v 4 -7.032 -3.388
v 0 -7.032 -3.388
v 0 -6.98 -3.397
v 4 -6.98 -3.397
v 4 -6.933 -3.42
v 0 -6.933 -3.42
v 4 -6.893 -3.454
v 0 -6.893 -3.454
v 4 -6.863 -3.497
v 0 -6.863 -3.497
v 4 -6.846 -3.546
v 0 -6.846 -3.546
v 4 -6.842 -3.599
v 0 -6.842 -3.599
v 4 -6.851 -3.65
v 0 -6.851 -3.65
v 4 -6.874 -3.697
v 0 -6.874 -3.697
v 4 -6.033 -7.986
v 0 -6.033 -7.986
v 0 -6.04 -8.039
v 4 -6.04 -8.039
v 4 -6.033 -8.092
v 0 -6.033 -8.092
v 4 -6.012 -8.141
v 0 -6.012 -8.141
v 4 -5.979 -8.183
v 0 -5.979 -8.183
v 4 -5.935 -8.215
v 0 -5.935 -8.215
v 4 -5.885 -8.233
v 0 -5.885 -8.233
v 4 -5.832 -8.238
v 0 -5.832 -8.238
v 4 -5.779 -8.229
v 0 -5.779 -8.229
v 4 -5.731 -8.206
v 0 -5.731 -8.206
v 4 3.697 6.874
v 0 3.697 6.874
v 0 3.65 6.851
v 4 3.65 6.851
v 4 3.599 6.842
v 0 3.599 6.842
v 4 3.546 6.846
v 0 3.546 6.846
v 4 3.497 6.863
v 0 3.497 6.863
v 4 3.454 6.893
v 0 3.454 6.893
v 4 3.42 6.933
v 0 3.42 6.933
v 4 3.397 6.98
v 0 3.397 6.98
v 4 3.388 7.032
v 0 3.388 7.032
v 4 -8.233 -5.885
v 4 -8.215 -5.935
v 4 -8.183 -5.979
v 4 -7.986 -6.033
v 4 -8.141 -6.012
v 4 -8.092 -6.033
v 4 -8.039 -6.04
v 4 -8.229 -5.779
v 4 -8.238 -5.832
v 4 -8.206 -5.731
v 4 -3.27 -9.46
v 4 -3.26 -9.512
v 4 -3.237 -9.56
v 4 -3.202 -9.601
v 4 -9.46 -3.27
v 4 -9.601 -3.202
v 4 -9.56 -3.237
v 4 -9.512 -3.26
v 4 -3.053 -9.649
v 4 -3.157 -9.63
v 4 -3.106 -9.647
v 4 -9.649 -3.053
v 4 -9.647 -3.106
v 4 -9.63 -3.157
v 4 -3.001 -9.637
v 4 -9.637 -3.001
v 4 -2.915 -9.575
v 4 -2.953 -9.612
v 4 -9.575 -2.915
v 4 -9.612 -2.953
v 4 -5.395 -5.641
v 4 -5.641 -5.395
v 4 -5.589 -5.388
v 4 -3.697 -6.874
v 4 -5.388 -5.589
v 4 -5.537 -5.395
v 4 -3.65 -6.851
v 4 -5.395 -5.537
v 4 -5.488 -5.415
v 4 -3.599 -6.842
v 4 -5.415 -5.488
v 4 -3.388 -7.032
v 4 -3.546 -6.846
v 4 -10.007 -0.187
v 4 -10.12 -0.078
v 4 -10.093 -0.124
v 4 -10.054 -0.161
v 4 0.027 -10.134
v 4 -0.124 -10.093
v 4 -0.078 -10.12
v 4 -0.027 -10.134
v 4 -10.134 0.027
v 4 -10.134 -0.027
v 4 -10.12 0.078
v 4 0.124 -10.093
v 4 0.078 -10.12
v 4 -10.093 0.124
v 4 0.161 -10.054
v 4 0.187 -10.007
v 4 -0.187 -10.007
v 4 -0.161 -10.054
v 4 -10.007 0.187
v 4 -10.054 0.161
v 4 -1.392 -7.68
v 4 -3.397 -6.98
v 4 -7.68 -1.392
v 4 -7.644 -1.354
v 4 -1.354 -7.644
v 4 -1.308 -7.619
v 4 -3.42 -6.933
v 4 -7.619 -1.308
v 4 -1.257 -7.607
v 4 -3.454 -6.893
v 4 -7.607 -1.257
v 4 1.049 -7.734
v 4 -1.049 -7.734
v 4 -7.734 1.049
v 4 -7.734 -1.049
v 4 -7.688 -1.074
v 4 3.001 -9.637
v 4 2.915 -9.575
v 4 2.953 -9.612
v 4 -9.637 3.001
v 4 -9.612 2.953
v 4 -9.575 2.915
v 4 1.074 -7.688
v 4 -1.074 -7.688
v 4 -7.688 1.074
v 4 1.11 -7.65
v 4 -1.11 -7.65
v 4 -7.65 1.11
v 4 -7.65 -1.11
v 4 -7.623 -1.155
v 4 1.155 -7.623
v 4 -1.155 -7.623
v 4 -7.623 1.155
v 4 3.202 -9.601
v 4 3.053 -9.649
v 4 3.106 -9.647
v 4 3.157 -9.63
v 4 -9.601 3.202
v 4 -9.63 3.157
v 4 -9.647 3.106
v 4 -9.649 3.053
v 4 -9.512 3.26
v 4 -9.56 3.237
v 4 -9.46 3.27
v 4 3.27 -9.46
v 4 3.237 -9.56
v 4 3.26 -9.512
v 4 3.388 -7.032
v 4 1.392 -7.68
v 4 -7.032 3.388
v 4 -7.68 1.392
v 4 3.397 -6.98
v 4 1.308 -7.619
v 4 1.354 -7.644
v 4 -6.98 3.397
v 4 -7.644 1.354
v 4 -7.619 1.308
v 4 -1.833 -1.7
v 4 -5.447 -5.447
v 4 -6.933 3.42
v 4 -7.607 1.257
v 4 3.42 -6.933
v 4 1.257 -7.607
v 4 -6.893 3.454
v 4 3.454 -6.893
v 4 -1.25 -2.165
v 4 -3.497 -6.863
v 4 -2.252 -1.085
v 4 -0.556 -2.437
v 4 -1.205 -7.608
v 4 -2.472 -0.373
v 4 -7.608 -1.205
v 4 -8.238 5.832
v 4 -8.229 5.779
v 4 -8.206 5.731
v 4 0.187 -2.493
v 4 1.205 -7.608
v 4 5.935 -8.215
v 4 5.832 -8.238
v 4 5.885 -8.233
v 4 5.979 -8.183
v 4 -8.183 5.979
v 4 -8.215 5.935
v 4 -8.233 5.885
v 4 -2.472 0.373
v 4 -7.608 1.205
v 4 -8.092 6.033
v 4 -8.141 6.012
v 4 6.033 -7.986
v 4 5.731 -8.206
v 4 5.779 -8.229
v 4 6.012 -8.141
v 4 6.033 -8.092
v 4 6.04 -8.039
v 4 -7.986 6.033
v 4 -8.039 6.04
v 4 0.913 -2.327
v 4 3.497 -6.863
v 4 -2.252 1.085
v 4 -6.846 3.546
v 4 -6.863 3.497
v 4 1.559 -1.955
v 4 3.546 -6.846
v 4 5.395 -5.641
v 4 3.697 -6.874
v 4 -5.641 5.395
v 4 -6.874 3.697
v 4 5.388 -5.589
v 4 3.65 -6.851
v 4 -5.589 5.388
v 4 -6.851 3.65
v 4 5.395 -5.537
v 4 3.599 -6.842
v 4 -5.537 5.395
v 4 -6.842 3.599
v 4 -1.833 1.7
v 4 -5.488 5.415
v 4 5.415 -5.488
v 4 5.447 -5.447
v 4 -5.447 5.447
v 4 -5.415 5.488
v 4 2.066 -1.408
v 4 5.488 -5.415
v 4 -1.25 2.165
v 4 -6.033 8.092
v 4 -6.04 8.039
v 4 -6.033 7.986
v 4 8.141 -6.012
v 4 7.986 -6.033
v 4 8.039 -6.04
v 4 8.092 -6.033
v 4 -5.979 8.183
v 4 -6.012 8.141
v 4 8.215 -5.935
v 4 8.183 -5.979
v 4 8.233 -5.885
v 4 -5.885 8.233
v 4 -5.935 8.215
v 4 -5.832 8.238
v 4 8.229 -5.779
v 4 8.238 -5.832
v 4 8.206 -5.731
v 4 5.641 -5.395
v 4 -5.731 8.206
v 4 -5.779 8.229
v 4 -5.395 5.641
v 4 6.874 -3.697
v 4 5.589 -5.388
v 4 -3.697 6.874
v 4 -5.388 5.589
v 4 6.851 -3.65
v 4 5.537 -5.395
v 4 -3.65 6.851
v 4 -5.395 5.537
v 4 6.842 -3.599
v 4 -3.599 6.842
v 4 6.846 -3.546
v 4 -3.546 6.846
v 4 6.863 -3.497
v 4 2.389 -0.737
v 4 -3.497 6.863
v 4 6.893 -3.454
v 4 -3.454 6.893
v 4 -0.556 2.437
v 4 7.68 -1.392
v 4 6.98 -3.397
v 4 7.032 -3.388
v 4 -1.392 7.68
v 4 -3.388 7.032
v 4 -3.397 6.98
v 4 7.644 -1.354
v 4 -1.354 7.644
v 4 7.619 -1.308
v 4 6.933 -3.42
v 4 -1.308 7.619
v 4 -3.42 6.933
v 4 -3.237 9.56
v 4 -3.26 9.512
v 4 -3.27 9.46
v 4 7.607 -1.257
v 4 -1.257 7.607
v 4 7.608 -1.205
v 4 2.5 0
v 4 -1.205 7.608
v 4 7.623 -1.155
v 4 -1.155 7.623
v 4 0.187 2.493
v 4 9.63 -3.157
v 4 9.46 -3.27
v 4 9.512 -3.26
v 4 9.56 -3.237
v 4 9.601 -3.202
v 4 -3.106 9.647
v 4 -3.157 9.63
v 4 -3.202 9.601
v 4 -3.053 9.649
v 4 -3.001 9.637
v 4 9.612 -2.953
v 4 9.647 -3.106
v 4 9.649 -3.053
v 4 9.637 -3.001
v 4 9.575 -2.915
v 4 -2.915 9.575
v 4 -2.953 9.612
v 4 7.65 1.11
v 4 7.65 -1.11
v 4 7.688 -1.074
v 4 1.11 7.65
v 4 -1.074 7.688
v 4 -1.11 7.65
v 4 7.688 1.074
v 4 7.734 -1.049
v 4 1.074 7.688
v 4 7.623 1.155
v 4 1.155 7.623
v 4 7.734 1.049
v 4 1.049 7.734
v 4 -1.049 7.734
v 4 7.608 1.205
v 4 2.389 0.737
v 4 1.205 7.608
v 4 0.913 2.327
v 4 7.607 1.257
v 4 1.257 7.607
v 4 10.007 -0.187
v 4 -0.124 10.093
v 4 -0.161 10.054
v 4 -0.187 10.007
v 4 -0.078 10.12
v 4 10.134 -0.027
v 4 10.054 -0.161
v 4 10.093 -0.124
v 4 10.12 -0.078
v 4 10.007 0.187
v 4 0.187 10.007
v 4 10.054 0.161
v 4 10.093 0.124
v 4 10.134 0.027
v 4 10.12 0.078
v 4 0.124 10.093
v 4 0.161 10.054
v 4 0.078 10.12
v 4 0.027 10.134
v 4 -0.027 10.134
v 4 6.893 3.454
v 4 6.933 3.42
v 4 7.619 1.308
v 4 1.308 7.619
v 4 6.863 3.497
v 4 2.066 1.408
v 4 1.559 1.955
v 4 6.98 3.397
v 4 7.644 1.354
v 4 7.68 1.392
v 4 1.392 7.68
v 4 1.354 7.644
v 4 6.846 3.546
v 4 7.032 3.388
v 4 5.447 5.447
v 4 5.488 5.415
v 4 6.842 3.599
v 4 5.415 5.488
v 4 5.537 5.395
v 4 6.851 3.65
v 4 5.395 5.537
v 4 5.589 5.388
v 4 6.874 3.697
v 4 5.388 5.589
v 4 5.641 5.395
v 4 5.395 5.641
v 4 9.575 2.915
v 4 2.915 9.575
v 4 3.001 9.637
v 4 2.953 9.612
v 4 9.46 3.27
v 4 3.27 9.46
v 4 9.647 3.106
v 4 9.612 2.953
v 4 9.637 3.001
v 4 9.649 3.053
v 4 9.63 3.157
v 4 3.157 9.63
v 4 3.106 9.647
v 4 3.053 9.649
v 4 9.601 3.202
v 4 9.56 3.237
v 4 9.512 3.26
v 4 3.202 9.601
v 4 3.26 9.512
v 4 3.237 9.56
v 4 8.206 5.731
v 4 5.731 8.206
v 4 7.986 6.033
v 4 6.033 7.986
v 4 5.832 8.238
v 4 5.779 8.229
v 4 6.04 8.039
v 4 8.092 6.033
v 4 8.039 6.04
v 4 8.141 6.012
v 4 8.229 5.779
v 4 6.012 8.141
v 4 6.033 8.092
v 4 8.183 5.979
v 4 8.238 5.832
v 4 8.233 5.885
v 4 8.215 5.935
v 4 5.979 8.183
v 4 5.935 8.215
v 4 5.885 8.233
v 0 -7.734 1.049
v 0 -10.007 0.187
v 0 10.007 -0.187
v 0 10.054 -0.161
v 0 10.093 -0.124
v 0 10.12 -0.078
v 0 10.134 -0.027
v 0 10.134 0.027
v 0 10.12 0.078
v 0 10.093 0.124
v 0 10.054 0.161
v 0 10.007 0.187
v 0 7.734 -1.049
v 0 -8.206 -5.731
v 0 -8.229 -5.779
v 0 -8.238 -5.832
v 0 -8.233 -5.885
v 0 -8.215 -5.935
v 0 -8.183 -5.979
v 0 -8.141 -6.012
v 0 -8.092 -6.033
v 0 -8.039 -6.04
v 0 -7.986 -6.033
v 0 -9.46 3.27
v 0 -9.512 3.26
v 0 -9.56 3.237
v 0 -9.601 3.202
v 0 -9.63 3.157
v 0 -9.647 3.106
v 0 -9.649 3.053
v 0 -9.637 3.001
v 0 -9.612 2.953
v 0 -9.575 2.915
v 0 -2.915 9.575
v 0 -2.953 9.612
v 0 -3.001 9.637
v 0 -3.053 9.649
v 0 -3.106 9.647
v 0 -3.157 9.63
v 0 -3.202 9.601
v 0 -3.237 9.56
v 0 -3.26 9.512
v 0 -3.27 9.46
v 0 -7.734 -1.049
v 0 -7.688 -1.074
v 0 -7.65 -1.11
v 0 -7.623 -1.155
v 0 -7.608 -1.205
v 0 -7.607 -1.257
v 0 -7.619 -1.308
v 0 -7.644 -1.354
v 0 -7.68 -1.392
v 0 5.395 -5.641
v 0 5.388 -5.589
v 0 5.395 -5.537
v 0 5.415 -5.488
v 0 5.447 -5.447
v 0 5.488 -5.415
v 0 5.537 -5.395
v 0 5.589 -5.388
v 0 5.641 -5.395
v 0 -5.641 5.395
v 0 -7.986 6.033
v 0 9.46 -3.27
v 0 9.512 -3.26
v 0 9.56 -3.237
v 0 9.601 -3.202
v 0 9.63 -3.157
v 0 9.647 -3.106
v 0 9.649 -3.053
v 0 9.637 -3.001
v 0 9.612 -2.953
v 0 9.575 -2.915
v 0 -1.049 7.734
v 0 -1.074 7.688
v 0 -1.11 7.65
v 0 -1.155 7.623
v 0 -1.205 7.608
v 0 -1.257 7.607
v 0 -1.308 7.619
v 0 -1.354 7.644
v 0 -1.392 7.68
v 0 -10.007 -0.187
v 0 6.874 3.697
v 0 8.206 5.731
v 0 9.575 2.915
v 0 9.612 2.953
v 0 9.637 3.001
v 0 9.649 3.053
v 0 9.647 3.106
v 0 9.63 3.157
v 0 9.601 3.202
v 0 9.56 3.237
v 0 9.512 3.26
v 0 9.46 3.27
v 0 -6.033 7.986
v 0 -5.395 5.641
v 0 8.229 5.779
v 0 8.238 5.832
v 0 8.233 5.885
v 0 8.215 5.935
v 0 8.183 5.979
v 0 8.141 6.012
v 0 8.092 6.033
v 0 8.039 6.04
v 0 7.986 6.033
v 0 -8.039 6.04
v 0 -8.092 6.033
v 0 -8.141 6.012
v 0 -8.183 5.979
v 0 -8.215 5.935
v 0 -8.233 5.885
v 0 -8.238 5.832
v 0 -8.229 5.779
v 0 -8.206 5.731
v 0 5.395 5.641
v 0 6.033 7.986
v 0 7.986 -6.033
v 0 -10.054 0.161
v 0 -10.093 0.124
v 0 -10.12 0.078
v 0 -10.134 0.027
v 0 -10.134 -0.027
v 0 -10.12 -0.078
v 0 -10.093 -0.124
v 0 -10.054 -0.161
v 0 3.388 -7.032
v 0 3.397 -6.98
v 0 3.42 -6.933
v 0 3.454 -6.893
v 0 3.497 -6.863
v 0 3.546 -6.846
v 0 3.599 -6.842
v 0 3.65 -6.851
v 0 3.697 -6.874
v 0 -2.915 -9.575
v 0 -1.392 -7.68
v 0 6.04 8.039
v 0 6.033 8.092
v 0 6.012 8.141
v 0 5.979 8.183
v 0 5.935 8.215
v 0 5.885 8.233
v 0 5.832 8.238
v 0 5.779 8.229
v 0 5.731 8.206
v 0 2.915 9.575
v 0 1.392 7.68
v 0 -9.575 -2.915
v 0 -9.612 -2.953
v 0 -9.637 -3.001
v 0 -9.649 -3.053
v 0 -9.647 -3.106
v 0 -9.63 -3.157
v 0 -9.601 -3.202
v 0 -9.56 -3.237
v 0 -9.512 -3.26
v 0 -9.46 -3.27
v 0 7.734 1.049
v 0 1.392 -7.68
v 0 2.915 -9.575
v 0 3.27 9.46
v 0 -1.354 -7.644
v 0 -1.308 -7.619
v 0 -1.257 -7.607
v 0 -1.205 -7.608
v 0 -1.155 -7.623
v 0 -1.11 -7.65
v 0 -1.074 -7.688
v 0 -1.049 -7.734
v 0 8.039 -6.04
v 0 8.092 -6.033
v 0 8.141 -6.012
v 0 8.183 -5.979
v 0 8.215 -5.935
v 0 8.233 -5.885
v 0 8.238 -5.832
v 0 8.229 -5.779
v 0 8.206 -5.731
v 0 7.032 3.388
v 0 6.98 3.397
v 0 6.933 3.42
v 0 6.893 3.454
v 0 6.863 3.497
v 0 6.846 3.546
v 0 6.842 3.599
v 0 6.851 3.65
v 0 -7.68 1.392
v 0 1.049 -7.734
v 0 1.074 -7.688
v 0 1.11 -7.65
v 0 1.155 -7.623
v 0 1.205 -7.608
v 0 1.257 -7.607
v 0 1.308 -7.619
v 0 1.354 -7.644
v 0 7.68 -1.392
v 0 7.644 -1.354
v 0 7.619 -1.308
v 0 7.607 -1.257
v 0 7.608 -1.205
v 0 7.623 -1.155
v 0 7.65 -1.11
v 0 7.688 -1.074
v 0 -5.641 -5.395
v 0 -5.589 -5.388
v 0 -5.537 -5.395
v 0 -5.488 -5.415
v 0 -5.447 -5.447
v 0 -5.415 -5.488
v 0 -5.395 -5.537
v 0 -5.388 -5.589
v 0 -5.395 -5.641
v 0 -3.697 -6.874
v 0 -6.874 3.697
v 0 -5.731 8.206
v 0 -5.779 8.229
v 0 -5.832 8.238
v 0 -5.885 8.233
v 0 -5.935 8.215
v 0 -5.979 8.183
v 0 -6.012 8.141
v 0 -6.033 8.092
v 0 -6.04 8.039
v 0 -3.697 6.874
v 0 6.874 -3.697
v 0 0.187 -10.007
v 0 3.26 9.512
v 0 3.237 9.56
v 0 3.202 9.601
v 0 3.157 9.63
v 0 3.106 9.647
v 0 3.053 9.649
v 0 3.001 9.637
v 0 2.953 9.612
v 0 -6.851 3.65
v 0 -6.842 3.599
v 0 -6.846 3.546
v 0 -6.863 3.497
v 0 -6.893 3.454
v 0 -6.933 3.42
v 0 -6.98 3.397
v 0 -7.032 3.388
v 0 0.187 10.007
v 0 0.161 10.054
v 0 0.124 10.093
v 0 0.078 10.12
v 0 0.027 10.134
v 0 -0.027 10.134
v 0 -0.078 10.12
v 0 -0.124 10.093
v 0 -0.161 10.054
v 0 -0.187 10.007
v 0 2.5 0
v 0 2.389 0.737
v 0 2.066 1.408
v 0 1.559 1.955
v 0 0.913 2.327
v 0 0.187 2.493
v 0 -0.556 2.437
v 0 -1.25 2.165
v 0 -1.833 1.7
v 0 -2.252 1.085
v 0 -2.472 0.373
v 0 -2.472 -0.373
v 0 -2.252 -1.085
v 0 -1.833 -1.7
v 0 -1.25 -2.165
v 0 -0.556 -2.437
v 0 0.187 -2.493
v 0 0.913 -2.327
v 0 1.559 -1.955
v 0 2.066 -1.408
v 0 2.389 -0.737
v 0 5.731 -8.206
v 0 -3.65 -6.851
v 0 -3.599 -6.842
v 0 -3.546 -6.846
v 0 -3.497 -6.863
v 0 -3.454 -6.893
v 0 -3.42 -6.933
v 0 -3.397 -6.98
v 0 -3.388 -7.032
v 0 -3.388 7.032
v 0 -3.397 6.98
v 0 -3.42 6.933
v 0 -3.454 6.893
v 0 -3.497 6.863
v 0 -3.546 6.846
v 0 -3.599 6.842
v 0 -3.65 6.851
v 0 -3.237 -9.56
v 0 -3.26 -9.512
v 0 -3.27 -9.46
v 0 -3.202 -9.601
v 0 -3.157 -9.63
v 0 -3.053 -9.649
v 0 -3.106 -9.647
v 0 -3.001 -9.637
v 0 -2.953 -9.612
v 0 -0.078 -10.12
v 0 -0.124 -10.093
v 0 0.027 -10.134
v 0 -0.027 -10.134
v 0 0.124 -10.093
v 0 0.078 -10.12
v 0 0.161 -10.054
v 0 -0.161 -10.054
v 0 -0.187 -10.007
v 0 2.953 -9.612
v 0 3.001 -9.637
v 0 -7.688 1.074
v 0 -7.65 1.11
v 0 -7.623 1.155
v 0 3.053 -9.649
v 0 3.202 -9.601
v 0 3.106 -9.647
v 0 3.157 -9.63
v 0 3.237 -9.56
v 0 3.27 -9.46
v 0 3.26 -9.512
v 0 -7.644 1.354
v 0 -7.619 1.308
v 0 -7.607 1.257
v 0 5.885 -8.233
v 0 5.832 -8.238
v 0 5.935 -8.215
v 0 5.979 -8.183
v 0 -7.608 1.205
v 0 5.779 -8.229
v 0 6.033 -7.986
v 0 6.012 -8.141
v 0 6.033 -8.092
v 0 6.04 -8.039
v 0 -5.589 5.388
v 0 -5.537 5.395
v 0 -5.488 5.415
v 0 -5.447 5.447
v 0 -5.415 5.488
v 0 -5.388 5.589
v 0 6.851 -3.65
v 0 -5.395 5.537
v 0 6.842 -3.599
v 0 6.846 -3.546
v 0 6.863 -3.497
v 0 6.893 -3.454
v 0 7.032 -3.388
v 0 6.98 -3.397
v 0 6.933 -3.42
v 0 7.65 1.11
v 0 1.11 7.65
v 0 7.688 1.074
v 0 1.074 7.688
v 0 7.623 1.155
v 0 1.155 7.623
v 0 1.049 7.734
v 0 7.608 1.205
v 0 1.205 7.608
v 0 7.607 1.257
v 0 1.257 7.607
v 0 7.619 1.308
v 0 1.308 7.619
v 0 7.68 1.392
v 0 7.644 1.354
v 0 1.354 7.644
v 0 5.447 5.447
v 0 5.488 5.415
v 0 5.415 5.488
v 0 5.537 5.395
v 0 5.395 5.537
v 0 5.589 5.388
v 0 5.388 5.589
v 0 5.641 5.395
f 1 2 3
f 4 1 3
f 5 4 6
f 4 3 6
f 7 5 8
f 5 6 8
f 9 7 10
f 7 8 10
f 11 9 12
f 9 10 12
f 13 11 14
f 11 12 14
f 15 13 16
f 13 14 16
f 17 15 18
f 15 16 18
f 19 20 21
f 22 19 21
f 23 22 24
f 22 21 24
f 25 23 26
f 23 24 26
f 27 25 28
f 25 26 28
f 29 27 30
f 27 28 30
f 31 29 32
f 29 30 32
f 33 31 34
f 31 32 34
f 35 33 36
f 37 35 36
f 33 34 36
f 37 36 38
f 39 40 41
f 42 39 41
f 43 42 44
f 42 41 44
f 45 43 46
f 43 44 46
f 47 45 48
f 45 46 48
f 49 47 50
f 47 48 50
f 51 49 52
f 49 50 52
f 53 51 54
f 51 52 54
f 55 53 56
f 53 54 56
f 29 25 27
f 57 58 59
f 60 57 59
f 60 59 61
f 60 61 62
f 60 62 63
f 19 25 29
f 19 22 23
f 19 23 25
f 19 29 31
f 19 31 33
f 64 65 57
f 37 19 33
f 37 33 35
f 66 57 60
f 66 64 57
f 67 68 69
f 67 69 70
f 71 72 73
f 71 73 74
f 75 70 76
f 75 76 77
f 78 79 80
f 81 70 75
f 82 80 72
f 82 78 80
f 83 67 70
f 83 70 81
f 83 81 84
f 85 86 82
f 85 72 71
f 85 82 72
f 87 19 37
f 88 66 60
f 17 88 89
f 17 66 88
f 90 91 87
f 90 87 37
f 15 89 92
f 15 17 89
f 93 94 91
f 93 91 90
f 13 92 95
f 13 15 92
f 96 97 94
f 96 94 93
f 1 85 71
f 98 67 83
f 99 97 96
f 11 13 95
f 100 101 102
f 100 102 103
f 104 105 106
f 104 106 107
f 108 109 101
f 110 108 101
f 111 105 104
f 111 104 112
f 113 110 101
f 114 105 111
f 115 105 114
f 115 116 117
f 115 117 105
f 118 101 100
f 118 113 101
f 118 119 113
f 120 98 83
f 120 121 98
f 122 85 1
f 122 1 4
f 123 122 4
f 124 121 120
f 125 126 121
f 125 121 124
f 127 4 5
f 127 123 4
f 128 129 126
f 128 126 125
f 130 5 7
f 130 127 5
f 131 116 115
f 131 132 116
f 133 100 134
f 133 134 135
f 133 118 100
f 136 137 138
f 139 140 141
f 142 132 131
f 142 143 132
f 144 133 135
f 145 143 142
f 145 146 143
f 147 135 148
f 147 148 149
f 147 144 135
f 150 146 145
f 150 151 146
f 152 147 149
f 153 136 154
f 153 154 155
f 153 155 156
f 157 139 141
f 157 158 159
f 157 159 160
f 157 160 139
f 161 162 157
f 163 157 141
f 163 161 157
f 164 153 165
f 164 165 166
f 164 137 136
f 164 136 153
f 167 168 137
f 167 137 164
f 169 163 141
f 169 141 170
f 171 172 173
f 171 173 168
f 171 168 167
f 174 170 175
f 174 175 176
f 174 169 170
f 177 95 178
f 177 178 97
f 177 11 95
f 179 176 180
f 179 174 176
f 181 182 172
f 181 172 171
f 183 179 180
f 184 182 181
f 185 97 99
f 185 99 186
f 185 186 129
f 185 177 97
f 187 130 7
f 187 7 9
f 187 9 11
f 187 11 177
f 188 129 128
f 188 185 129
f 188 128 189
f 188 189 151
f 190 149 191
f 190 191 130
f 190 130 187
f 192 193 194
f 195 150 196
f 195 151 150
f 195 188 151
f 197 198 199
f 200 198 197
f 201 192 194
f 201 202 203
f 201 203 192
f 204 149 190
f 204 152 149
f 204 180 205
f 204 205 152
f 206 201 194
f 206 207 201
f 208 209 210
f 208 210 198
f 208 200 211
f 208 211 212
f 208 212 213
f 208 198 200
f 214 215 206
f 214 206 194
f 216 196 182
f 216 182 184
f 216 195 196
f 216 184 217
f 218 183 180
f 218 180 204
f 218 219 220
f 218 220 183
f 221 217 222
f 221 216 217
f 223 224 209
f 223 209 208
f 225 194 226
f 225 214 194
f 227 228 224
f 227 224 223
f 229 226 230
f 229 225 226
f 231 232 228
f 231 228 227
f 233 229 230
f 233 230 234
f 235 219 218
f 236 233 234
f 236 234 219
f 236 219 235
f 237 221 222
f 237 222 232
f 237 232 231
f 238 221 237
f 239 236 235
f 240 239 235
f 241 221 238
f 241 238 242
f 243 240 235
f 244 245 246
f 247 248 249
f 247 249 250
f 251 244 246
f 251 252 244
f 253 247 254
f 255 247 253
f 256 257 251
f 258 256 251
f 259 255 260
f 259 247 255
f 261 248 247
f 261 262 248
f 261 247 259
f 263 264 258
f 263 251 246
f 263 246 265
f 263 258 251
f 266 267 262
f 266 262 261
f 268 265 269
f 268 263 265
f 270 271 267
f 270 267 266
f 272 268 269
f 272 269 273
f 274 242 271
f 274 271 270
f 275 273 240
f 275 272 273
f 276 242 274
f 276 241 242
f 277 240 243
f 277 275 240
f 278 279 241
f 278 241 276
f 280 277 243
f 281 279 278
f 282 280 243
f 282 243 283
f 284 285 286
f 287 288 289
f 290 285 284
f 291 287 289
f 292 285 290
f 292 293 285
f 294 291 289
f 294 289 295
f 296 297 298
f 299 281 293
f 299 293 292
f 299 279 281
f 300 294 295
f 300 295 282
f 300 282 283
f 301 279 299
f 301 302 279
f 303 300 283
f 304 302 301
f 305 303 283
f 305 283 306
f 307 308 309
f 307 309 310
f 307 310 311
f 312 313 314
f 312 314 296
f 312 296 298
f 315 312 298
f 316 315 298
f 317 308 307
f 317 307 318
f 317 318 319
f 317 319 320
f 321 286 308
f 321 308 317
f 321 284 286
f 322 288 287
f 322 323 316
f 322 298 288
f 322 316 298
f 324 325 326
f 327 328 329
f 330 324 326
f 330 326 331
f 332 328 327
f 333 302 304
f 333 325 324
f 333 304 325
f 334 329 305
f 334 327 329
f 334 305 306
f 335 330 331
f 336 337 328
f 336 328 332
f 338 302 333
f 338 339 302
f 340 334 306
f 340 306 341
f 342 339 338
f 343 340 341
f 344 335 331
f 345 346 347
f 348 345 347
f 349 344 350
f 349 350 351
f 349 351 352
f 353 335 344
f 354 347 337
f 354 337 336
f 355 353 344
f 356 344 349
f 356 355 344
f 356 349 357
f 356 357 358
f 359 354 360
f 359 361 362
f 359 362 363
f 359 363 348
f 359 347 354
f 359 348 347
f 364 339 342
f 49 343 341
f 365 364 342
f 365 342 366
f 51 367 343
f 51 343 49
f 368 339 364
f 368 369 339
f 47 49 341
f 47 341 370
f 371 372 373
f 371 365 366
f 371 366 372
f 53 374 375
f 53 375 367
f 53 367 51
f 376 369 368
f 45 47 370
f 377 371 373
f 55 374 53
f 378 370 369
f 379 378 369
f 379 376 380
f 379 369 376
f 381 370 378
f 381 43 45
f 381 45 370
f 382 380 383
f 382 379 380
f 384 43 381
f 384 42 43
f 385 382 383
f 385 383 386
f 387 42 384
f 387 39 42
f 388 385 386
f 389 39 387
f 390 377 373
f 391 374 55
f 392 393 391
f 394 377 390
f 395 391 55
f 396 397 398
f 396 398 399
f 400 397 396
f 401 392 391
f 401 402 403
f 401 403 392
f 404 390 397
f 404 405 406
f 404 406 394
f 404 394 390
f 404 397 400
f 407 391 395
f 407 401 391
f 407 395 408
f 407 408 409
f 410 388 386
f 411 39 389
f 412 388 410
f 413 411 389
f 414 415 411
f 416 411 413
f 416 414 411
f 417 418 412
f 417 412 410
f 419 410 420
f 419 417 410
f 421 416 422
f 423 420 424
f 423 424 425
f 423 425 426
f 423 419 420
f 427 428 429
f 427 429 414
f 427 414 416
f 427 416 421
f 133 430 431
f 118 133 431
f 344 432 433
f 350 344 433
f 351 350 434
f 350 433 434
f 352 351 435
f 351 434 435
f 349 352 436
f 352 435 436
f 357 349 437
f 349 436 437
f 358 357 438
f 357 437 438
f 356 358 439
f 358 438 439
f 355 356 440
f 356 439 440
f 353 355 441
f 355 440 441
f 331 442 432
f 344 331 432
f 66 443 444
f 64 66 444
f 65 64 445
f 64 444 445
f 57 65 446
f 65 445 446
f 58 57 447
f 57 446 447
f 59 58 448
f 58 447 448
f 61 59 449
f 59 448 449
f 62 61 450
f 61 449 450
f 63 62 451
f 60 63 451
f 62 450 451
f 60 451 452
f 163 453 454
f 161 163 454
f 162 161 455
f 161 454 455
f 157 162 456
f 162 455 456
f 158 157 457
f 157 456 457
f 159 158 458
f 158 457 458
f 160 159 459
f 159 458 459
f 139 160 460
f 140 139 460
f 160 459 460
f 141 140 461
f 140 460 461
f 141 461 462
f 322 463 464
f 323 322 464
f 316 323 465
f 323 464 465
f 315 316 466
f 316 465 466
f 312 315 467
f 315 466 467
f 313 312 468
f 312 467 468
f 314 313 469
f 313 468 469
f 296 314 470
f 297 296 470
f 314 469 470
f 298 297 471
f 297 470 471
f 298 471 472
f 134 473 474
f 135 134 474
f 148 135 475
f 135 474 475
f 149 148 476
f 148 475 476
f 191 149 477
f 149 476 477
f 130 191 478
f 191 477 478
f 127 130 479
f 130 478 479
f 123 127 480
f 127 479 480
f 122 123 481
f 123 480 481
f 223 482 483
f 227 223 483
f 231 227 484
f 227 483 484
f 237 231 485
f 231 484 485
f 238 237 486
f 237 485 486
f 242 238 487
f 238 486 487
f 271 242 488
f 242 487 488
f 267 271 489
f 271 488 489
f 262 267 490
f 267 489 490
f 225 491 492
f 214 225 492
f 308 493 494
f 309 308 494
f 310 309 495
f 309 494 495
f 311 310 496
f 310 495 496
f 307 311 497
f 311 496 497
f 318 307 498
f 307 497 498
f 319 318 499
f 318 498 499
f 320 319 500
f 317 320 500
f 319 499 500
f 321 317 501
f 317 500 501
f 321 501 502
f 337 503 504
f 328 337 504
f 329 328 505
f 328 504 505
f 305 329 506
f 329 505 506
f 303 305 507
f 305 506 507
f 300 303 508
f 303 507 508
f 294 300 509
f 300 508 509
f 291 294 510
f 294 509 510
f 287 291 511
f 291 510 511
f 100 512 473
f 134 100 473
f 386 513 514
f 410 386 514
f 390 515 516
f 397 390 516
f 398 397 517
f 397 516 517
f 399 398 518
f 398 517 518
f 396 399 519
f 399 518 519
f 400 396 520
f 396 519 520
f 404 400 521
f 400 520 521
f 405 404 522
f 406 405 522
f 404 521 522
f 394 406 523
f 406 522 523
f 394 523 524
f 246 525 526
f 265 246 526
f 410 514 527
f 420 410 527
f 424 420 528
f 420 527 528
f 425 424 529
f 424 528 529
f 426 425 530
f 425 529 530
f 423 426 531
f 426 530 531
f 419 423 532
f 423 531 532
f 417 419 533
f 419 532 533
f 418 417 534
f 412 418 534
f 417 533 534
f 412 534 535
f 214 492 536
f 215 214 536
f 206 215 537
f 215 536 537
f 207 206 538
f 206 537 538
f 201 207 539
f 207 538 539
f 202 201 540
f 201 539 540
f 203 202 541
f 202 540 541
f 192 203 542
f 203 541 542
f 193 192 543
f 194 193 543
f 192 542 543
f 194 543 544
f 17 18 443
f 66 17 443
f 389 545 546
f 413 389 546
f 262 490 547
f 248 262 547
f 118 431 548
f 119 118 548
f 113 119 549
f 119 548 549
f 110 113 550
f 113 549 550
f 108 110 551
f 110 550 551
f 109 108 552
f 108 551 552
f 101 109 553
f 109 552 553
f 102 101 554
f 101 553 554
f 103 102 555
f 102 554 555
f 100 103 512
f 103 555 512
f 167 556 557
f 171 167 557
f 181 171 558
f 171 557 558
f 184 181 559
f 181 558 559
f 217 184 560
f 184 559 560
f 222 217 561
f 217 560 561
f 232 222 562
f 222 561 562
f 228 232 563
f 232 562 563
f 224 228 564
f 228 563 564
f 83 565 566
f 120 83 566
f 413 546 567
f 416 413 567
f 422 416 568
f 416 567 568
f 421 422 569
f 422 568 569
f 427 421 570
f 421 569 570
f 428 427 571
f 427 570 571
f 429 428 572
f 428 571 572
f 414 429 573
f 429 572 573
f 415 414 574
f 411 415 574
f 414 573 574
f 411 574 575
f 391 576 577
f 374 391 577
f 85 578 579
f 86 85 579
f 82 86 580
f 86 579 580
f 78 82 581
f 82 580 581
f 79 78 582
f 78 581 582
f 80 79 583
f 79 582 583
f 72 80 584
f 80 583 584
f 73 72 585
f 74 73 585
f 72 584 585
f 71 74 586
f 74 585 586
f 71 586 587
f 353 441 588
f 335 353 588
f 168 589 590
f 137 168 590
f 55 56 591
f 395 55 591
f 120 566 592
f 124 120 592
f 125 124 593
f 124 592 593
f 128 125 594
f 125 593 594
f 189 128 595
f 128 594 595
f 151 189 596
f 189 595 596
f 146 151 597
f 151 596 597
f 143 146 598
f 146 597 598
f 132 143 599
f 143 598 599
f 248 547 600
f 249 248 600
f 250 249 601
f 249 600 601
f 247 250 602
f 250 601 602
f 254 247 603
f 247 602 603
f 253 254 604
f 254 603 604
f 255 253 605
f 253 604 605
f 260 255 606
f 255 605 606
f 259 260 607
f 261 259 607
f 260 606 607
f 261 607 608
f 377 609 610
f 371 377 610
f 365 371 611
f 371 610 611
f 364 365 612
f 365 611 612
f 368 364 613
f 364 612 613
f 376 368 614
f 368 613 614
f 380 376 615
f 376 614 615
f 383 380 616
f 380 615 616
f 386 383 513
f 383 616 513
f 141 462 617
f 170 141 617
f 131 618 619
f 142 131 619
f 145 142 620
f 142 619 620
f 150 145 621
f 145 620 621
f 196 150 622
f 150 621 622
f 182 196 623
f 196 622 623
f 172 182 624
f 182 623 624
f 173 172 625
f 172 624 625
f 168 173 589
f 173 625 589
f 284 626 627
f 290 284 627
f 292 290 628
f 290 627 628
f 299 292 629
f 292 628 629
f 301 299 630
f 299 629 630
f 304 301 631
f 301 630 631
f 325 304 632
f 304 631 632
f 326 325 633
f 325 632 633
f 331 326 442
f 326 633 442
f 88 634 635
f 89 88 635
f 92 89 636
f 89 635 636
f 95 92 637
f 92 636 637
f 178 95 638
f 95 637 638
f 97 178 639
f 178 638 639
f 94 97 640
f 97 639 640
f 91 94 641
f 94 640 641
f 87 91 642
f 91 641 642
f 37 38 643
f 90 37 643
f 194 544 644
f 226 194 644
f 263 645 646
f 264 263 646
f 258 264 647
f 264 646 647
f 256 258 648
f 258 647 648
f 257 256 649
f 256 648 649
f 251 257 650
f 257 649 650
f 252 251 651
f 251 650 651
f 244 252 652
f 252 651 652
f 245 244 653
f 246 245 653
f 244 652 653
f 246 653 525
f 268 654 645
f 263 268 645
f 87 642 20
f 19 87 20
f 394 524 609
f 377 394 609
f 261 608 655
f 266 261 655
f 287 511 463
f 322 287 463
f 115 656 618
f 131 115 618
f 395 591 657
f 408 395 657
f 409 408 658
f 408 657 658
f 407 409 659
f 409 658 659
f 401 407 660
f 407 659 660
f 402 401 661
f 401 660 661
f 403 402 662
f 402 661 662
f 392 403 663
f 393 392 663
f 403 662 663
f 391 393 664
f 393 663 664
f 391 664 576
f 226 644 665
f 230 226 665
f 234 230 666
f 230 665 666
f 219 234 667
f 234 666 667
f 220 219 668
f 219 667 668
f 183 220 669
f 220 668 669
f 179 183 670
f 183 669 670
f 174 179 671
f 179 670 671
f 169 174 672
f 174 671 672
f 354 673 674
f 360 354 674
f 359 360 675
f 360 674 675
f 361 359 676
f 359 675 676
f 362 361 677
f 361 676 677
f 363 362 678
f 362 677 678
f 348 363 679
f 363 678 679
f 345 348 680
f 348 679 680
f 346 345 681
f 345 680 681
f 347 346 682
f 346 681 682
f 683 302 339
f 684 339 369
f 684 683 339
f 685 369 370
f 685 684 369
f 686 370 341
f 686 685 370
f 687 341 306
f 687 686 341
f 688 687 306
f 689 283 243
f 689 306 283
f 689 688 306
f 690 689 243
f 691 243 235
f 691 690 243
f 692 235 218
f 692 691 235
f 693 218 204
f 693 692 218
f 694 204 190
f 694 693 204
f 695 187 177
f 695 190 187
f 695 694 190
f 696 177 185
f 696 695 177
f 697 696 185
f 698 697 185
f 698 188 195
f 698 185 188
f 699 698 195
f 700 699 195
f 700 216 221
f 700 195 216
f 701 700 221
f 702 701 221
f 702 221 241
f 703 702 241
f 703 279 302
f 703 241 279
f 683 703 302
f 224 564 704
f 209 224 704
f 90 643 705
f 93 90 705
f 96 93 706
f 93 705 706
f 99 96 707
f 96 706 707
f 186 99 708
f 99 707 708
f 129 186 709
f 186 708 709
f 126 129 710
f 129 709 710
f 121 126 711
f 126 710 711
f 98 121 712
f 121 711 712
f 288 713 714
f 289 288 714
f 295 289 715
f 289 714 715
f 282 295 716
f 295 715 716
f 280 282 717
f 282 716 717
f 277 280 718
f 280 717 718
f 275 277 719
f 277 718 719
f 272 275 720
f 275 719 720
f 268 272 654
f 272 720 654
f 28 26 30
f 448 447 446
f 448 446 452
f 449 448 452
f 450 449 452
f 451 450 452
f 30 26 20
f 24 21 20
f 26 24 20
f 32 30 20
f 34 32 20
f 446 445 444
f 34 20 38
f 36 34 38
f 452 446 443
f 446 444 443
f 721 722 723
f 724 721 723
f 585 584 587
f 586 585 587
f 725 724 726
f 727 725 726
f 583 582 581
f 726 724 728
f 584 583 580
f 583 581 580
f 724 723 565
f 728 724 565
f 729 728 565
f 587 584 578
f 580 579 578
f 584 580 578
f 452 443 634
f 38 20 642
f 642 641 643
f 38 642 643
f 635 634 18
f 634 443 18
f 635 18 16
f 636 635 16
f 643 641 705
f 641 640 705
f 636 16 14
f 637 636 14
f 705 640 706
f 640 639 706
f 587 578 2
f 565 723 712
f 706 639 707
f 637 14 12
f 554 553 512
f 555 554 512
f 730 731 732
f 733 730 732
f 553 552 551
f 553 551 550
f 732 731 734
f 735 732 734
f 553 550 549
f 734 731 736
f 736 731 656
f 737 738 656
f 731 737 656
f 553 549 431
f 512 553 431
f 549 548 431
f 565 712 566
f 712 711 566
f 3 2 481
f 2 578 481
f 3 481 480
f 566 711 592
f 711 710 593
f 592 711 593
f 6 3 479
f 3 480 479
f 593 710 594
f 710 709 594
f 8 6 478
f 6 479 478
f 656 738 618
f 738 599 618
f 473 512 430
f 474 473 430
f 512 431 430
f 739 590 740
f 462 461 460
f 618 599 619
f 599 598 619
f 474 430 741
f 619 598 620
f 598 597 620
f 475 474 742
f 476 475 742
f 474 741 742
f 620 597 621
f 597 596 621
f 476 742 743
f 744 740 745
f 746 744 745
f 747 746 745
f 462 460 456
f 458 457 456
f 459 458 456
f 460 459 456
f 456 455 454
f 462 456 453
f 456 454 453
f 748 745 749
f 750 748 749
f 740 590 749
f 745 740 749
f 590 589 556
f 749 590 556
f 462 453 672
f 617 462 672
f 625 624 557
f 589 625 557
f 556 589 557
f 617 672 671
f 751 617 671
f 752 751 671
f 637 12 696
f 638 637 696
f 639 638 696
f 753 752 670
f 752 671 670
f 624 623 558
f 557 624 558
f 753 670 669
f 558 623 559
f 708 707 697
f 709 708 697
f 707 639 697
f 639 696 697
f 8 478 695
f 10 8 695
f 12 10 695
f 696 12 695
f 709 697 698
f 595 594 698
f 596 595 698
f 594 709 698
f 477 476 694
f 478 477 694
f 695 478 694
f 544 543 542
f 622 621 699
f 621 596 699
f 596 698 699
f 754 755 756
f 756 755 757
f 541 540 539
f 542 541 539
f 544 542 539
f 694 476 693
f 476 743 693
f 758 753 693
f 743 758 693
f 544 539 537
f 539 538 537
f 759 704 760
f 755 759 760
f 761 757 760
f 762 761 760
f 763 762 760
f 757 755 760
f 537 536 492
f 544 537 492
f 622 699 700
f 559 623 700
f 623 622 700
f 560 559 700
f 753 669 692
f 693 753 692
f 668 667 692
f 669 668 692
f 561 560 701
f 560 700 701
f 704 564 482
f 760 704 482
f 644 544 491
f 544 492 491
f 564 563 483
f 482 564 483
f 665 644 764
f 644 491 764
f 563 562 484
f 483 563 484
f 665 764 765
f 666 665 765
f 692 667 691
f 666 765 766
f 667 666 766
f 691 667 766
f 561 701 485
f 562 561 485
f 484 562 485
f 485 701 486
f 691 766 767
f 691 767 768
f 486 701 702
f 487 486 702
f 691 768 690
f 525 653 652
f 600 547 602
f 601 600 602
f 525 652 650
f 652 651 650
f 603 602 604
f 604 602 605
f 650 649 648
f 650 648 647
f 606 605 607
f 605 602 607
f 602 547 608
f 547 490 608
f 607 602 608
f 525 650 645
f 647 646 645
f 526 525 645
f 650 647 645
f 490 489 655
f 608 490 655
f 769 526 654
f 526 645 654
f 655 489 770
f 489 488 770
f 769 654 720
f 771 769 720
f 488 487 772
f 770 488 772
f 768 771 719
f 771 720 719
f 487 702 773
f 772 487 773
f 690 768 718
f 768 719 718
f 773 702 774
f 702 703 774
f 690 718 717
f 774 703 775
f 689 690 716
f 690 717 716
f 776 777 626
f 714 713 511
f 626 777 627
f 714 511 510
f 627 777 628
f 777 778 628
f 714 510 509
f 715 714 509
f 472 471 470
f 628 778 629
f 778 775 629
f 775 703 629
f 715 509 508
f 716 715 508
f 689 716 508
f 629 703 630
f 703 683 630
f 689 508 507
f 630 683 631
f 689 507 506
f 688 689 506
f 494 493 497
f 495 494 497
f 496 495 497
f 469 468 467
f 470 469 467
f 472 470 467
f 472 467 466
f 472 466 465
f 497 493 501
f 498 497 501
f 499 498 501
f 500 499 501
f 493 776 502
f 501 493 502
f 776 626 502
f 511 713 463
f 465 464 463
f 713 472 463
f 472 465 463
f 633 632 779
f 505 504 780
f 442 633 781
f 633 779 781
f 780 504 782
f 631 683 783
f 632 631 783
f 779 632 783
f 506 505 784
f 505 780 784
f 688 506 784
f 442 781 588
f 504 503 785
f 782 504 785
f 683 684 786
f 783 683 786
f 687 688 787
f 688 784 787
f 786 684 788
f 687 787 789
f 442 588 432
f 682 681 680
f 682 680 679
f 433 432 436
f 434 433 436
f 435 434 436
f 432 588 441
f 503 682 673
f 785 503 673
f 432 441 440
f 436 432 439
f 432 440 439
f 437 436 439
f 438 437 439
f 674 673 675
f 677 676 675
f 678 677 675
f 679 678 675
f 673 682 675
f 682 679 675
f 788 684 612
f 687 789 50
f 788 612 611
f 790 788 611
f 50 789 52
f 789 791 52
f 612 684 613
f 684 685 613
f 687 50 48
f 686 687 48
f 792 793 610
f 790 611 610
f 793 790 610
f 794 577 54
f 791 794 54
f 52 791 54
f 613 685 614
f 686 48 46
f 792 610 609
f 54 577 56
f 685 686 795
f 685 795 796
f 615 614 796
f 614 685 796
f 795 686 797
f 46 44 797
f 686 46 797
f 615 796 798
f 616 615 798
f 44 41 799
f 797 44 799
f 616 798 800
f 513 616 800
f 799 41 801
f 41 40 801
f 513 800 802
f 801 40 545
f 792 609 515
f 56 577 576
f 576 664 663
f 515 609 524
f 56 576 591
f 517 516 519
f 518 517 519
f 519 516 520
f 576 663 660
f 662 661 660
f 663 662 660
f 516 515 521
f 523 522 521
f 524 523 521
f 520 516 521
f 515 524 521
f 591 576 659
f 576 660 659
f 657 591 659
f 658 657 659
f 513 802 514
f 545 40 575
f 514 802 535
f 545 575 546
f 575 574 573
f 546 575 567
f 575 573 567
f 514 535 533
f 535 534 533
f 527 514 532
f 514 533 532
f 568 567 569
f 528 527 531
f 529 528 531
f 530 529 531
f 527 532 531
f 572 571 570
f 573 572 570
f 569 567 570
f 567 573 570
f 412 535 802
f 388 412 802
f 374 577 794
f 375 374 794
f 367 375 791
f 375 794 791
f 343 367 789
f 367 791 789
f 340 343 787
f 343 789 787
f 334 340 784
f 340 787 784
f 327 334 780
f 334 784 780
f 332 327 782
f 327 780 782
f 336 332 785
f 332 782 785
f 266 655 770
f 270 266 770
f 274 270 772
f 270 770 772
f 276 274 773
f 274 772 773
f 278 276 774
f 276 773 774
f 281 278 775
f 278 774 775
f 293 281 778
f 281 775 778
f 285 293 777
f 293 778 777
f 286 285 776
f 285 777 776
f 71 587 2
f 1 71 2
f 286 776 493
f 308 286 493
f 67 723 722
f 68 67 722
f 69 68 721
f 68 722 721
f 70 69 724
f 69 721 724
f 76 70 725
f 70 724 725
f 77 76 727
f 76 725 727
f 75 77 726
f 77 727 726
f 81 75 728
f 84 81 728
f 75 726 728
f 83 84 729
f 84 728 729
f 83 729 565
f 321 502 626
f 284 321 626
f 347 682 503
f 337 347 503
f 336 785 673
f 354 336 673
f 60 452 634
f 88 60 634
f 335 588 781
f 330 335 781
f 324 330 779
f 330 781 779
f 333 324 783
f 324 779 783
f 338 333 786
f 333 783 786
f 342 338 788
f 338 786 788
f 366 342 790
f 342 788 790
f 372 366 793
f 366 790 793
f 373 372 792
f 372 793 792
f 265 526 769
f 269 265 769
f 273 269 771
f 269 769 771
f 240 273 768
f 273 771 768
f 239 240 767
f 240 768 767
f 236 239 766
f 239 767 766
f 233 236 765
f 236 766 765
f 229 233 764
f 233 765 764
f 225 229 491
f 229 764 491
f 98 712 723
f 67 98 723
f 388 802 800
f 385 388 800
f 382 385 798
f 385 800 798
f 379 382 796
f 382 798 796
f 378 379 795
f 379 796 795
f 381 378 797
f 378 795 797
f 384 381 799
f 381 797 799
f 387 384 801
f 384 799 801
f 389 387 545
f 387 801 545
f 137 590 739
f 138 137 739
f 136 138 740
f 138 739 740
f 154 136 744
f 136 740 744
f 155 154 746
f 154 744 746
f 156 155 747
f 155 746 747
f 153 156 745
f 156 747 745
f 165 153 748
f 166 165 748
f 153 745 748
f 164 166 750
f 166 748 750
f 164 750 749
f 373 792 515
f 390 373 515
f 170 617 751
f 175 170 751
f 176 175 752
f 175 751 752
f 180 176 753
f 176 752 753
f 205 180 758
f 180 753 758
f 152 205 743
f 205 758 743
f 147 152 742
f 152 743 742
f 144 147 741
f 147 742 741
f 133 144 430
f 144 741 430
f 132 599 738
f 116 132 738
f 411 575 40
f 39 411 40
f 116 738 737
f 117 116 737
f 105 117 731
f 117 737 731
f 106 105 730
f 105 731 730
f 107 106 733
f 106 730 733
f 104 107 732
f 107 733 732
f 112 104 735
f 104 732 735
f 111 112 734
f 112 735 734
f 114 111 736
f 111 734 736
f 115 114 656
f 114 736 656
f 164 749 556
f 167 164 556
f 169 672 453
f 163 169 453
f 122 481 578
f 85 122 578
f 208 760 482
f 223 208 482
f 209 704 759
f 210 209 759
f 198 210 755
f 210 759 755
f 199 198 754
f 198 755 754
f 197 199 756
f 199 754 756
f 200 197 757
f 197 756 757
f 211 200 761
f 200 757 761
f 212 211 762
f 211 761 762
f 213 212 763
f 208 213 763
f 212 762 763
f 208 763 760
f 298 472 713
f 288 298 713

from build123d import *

# Parameters (mm, degrees)
F1_DEPTH = 4
F2_R     = 2.5
F3_DEPTH = 4.001


with BuildPart() as f1:
    # F0 (on Right) → F1 (new body)
    with BuildSketch(Plane.YZ):
        with BuildLine():
            ThreePointArc((0.186993, 10.007145), (0, 10.136198), (-0.186993, 10.007145))
            Line((-0.186993, 10.007145), (-1.049264, 7.734473))
            ThreePointArc((-1.049264, 7.734473), (-1.20497, 7.607883), (-1.392175, 7.680162))
            Line((-1.392175, 7.680162), (-2.914536, 9.575144))
            ThreePointArc((-2.914536, 9.575144), (-3.132257, 9.640097), (-3.270219, 9.459576))
            Line((-3.270219, 9.459576), (-3.387993, 7.031681))
            ThreePointArc((-3.387993, 7.031681), (-3.49696, 6.86317), (-3.697337, 6.874062))
            Line((-3.697337, 6.874062), (-5.730771, 8.205862))
            ThreePointArc((-5.730771, 8.205862), (-5.957908, 8.200356), (-6.033333, 7.986038))
            Line((-6.033333, 7.986038), (-5.395082, 5.640579))
            ThreePointArc((-5.395082, 5.640579), (-5.446643, 5.446643), (-5.640579, 5.395082))
            Line((-5.640579, 5.395082), (-7.986038, 6.033333))
            ThreePointArc((-7.986038, 6.033333), (-8.200356, 5.957908), (-8.205862, 5.730771))
            Line((-8.205862, 5.730771), (-6.874062, 3.697337))
            ThreePointArc((-6.874062, 3.697337), (-6.86317, 3.49696), (-7.031681, 3.387993))
            Line((-7.031681, 3.387993), (-9.459576, 3.270219))
            ThreePointArc((-9.459576, 3.270219), (-9.640097, 3.132257), (-9.575144, 2.914536))
            Line((-9.575144, 2.914536), (-7.680162, 1.392175))
            ThreePointArc((-7.680162, 1.392175), (-7.607883, 1.20497), (-7.734473, 1.049264))
            Line((-7.734473, 1.049264), (-10.007145, 0.186993))
            ThreePointArc((-10.007145, 0.186993), (-10.136198, 0), (-10.007145, -0.186993))
            Line((-10.007145, -0.186993), (-7.734473, -1.049264))
            ThreePointArc((-7.734473, -1.049264), (-7.607883, -1.20497), (-7.680162, -1.392175))
            Line((-7.680162, -1.392175), (-9.575144, -2.914536))
            ThreePointArc((-9.575144, -2.914536), (-9.640097, -3.132257), (-9.459576, -3.270219))
            Line((-9.459576, -3.270219), (-7.031681, -3.387993))
            ThreePointArc((-7.031681, -3.387993), (-6.86317, -3.49696), (-6.874062, -3.697337))
            Line((-6.874062, -3.697337), (-8.205862, -5.730771))
            ThreePointArc((-8.205862, -5.730771), (-8.200356, -5.957908), (-7.986038, -6.033333))
            Line((-7.986038, -6.033333), (-5.640579, -5.395082))
            ThreePointArc((-5.640579, -5.395082), (-5.446643, -5.446643), (-5.395082, -5.640579))
            Line((-5.395082, -5.640579), (-6.033333, -7.986038))
            ThreePointArc((-6.033333, -7.986038), (-5.957908, -8.200356), (-5.730771, -8.205862))
            Line((-5.730771, -8.205862), (-3.697337, -6.874062))
            ThreePointArc((-3.697337, -6.874062), (-3.49696, -6.86317), (-3.387993, -7.031681))
            Line((-3.387993, -7.031681), (-3.270219, -9.459576))
            ThreePointArc((-3.270219, -9.459576), (-3.132257, -9.640097), (-2.914536, -9.575144))
            Line((-2.914536, -9.575144), (-1.392175, -7.680162))
            ThreePointArc((-1.392175, -7.680162), (-1.20497, -7.607883), (-1.049264, -7.734473))
            Line((-1.049264, -7.734473), (-0.186993, -10.007145))
            ThreePointArc((-0.186993, -10.007145), (0, -10.136198), (0.186993, -10.007145))
            Line((0.186993, -10.007145), (1.049264, -7.734473))
            ThreePointArc((1.049264, -7.734473), (1.20497, -7.607883), (1.392175, -7.680162))
            Line((1.392175, -7.680162), (2.914536, -9.575144))
            ThreePointArc((2.914536, -9.575144), (3.132257, -9.640097), (3.270219, -9.459576))
            Line((3.270219, -9.459576), (3.387993, -7.031681))
            ThreePointArc((3.387993, -7.031681), (3.49696, -6.86317), (3.697337, -6.874062))
            Line((3.697337, -6.874062), (5.730771, -8.205862))
            ThreePointArc((5.730771, -8.205862), (5.957908, -8.200356), (6.033333, -7.986038))
            Line((6.033333, -7.986038), (5.395082, -5.640579))
            ThreePointArc((5.395082, -5.640579), (5.446643, -5.446643), (5.640579, -5.395082))
            Line((5.640579, -5.395082), (7.986038, -6.033333))
            ThreePointArc((7.986038, -6.033333), (8.200356, -5.957908), (8.205862, -5.730771))
            Line((8.205862, -5.730771), (6.874062, -3.697337))
            ThreePointArc((6.874062, -3.697337), (6.86317, -3.49696), (7.031681, -3.387993))
            Line((7.031681, -3.387993), (9.459576, -3.270219))
            ThreePointArc((9.459576, -3.270219), (9.640097, -3.132257), (9.575144, -2.914536))
            Line((9.575144, -2.914536), (7.680162, -1.392175))
            ThreePointArc((7.680162, -1.392175), (7.607883, -1.20497), (7.734473, -1.049264))
            Line((7.734473, -1.049264), (10.007145, -0.186993))
            ThreePointArc((10.007145, -0.186993), (10.136198, 0), (10.007145, 0.186993))
            Line((10.007145, 0.186993), (7.734473, 1.049264))
            ThreePointArc((7.734473, 1.049264), (7.607883, 1.20497), (7.680162, 1.392175))
            Line((7.680162, 1.392175), (9.575144, 2.914536))
            ThreePointArc((9.575144, 2.914536), (9.640097, 3.132257), (9.459576, 3.270219))
            Line((9.459576, 3.270219), (7.031681, 3.387993))
            ThreePointArc((7.031681, 3.387993), (6.86317, 3.49696), (6.874062, 3.697337))
            Line((6.874062, 3.697337), (8.205862, 5.730771))
            ThreePointArc((8.205862, 5.730771), (8.200356, 5.957908), (7.986038, 6.033333))
            Line((7.986038, 6.033333), (5.640579, 5.395082))
            ThreePointArc((5.640579, 5.395082), (5.446643, 5.446643), (5.395082, 5.640579))
            Line((5.395082, 5.640579), (6.033333, 7.986038))
            ThreePointArc((6.033333, 7.986038), (5.957908, 8.200356), (5.730771, 8.205862))
            Line((5.730771, 8.205862), (3.697337, 6.874062))
            ThreePointArc((3.697337, 6.874062), (3.49696, 6.86317), (3.387993, 7.031681))
            Line((3.387993, 7.031681), (3.270219, 9.459576))
            ThreePointArc((3.270219, 9.459576), (3.132257, 9.640097), (2.914536, 9.575144))
            Line((2.914536, 9.575144), (1.392175, 7.680162))
            ThreePointArc((1.392175, 7.680162), (1.20497, 7.607883), (1.049264, 7.734473))
            Line((1.049264, 7.734473), (0.186993, 10.007145))
        make_face()
    extrude(amount=F1_DEPTH)

    # F2 (on Right) → F3 (cut, through all)
    with BuildSketch(Plane.YZ):
        Circle(F2_R)
    extrude(amount=F3_DEPTH, mode=Mode.SUBTRACT)


solid = f1.part
